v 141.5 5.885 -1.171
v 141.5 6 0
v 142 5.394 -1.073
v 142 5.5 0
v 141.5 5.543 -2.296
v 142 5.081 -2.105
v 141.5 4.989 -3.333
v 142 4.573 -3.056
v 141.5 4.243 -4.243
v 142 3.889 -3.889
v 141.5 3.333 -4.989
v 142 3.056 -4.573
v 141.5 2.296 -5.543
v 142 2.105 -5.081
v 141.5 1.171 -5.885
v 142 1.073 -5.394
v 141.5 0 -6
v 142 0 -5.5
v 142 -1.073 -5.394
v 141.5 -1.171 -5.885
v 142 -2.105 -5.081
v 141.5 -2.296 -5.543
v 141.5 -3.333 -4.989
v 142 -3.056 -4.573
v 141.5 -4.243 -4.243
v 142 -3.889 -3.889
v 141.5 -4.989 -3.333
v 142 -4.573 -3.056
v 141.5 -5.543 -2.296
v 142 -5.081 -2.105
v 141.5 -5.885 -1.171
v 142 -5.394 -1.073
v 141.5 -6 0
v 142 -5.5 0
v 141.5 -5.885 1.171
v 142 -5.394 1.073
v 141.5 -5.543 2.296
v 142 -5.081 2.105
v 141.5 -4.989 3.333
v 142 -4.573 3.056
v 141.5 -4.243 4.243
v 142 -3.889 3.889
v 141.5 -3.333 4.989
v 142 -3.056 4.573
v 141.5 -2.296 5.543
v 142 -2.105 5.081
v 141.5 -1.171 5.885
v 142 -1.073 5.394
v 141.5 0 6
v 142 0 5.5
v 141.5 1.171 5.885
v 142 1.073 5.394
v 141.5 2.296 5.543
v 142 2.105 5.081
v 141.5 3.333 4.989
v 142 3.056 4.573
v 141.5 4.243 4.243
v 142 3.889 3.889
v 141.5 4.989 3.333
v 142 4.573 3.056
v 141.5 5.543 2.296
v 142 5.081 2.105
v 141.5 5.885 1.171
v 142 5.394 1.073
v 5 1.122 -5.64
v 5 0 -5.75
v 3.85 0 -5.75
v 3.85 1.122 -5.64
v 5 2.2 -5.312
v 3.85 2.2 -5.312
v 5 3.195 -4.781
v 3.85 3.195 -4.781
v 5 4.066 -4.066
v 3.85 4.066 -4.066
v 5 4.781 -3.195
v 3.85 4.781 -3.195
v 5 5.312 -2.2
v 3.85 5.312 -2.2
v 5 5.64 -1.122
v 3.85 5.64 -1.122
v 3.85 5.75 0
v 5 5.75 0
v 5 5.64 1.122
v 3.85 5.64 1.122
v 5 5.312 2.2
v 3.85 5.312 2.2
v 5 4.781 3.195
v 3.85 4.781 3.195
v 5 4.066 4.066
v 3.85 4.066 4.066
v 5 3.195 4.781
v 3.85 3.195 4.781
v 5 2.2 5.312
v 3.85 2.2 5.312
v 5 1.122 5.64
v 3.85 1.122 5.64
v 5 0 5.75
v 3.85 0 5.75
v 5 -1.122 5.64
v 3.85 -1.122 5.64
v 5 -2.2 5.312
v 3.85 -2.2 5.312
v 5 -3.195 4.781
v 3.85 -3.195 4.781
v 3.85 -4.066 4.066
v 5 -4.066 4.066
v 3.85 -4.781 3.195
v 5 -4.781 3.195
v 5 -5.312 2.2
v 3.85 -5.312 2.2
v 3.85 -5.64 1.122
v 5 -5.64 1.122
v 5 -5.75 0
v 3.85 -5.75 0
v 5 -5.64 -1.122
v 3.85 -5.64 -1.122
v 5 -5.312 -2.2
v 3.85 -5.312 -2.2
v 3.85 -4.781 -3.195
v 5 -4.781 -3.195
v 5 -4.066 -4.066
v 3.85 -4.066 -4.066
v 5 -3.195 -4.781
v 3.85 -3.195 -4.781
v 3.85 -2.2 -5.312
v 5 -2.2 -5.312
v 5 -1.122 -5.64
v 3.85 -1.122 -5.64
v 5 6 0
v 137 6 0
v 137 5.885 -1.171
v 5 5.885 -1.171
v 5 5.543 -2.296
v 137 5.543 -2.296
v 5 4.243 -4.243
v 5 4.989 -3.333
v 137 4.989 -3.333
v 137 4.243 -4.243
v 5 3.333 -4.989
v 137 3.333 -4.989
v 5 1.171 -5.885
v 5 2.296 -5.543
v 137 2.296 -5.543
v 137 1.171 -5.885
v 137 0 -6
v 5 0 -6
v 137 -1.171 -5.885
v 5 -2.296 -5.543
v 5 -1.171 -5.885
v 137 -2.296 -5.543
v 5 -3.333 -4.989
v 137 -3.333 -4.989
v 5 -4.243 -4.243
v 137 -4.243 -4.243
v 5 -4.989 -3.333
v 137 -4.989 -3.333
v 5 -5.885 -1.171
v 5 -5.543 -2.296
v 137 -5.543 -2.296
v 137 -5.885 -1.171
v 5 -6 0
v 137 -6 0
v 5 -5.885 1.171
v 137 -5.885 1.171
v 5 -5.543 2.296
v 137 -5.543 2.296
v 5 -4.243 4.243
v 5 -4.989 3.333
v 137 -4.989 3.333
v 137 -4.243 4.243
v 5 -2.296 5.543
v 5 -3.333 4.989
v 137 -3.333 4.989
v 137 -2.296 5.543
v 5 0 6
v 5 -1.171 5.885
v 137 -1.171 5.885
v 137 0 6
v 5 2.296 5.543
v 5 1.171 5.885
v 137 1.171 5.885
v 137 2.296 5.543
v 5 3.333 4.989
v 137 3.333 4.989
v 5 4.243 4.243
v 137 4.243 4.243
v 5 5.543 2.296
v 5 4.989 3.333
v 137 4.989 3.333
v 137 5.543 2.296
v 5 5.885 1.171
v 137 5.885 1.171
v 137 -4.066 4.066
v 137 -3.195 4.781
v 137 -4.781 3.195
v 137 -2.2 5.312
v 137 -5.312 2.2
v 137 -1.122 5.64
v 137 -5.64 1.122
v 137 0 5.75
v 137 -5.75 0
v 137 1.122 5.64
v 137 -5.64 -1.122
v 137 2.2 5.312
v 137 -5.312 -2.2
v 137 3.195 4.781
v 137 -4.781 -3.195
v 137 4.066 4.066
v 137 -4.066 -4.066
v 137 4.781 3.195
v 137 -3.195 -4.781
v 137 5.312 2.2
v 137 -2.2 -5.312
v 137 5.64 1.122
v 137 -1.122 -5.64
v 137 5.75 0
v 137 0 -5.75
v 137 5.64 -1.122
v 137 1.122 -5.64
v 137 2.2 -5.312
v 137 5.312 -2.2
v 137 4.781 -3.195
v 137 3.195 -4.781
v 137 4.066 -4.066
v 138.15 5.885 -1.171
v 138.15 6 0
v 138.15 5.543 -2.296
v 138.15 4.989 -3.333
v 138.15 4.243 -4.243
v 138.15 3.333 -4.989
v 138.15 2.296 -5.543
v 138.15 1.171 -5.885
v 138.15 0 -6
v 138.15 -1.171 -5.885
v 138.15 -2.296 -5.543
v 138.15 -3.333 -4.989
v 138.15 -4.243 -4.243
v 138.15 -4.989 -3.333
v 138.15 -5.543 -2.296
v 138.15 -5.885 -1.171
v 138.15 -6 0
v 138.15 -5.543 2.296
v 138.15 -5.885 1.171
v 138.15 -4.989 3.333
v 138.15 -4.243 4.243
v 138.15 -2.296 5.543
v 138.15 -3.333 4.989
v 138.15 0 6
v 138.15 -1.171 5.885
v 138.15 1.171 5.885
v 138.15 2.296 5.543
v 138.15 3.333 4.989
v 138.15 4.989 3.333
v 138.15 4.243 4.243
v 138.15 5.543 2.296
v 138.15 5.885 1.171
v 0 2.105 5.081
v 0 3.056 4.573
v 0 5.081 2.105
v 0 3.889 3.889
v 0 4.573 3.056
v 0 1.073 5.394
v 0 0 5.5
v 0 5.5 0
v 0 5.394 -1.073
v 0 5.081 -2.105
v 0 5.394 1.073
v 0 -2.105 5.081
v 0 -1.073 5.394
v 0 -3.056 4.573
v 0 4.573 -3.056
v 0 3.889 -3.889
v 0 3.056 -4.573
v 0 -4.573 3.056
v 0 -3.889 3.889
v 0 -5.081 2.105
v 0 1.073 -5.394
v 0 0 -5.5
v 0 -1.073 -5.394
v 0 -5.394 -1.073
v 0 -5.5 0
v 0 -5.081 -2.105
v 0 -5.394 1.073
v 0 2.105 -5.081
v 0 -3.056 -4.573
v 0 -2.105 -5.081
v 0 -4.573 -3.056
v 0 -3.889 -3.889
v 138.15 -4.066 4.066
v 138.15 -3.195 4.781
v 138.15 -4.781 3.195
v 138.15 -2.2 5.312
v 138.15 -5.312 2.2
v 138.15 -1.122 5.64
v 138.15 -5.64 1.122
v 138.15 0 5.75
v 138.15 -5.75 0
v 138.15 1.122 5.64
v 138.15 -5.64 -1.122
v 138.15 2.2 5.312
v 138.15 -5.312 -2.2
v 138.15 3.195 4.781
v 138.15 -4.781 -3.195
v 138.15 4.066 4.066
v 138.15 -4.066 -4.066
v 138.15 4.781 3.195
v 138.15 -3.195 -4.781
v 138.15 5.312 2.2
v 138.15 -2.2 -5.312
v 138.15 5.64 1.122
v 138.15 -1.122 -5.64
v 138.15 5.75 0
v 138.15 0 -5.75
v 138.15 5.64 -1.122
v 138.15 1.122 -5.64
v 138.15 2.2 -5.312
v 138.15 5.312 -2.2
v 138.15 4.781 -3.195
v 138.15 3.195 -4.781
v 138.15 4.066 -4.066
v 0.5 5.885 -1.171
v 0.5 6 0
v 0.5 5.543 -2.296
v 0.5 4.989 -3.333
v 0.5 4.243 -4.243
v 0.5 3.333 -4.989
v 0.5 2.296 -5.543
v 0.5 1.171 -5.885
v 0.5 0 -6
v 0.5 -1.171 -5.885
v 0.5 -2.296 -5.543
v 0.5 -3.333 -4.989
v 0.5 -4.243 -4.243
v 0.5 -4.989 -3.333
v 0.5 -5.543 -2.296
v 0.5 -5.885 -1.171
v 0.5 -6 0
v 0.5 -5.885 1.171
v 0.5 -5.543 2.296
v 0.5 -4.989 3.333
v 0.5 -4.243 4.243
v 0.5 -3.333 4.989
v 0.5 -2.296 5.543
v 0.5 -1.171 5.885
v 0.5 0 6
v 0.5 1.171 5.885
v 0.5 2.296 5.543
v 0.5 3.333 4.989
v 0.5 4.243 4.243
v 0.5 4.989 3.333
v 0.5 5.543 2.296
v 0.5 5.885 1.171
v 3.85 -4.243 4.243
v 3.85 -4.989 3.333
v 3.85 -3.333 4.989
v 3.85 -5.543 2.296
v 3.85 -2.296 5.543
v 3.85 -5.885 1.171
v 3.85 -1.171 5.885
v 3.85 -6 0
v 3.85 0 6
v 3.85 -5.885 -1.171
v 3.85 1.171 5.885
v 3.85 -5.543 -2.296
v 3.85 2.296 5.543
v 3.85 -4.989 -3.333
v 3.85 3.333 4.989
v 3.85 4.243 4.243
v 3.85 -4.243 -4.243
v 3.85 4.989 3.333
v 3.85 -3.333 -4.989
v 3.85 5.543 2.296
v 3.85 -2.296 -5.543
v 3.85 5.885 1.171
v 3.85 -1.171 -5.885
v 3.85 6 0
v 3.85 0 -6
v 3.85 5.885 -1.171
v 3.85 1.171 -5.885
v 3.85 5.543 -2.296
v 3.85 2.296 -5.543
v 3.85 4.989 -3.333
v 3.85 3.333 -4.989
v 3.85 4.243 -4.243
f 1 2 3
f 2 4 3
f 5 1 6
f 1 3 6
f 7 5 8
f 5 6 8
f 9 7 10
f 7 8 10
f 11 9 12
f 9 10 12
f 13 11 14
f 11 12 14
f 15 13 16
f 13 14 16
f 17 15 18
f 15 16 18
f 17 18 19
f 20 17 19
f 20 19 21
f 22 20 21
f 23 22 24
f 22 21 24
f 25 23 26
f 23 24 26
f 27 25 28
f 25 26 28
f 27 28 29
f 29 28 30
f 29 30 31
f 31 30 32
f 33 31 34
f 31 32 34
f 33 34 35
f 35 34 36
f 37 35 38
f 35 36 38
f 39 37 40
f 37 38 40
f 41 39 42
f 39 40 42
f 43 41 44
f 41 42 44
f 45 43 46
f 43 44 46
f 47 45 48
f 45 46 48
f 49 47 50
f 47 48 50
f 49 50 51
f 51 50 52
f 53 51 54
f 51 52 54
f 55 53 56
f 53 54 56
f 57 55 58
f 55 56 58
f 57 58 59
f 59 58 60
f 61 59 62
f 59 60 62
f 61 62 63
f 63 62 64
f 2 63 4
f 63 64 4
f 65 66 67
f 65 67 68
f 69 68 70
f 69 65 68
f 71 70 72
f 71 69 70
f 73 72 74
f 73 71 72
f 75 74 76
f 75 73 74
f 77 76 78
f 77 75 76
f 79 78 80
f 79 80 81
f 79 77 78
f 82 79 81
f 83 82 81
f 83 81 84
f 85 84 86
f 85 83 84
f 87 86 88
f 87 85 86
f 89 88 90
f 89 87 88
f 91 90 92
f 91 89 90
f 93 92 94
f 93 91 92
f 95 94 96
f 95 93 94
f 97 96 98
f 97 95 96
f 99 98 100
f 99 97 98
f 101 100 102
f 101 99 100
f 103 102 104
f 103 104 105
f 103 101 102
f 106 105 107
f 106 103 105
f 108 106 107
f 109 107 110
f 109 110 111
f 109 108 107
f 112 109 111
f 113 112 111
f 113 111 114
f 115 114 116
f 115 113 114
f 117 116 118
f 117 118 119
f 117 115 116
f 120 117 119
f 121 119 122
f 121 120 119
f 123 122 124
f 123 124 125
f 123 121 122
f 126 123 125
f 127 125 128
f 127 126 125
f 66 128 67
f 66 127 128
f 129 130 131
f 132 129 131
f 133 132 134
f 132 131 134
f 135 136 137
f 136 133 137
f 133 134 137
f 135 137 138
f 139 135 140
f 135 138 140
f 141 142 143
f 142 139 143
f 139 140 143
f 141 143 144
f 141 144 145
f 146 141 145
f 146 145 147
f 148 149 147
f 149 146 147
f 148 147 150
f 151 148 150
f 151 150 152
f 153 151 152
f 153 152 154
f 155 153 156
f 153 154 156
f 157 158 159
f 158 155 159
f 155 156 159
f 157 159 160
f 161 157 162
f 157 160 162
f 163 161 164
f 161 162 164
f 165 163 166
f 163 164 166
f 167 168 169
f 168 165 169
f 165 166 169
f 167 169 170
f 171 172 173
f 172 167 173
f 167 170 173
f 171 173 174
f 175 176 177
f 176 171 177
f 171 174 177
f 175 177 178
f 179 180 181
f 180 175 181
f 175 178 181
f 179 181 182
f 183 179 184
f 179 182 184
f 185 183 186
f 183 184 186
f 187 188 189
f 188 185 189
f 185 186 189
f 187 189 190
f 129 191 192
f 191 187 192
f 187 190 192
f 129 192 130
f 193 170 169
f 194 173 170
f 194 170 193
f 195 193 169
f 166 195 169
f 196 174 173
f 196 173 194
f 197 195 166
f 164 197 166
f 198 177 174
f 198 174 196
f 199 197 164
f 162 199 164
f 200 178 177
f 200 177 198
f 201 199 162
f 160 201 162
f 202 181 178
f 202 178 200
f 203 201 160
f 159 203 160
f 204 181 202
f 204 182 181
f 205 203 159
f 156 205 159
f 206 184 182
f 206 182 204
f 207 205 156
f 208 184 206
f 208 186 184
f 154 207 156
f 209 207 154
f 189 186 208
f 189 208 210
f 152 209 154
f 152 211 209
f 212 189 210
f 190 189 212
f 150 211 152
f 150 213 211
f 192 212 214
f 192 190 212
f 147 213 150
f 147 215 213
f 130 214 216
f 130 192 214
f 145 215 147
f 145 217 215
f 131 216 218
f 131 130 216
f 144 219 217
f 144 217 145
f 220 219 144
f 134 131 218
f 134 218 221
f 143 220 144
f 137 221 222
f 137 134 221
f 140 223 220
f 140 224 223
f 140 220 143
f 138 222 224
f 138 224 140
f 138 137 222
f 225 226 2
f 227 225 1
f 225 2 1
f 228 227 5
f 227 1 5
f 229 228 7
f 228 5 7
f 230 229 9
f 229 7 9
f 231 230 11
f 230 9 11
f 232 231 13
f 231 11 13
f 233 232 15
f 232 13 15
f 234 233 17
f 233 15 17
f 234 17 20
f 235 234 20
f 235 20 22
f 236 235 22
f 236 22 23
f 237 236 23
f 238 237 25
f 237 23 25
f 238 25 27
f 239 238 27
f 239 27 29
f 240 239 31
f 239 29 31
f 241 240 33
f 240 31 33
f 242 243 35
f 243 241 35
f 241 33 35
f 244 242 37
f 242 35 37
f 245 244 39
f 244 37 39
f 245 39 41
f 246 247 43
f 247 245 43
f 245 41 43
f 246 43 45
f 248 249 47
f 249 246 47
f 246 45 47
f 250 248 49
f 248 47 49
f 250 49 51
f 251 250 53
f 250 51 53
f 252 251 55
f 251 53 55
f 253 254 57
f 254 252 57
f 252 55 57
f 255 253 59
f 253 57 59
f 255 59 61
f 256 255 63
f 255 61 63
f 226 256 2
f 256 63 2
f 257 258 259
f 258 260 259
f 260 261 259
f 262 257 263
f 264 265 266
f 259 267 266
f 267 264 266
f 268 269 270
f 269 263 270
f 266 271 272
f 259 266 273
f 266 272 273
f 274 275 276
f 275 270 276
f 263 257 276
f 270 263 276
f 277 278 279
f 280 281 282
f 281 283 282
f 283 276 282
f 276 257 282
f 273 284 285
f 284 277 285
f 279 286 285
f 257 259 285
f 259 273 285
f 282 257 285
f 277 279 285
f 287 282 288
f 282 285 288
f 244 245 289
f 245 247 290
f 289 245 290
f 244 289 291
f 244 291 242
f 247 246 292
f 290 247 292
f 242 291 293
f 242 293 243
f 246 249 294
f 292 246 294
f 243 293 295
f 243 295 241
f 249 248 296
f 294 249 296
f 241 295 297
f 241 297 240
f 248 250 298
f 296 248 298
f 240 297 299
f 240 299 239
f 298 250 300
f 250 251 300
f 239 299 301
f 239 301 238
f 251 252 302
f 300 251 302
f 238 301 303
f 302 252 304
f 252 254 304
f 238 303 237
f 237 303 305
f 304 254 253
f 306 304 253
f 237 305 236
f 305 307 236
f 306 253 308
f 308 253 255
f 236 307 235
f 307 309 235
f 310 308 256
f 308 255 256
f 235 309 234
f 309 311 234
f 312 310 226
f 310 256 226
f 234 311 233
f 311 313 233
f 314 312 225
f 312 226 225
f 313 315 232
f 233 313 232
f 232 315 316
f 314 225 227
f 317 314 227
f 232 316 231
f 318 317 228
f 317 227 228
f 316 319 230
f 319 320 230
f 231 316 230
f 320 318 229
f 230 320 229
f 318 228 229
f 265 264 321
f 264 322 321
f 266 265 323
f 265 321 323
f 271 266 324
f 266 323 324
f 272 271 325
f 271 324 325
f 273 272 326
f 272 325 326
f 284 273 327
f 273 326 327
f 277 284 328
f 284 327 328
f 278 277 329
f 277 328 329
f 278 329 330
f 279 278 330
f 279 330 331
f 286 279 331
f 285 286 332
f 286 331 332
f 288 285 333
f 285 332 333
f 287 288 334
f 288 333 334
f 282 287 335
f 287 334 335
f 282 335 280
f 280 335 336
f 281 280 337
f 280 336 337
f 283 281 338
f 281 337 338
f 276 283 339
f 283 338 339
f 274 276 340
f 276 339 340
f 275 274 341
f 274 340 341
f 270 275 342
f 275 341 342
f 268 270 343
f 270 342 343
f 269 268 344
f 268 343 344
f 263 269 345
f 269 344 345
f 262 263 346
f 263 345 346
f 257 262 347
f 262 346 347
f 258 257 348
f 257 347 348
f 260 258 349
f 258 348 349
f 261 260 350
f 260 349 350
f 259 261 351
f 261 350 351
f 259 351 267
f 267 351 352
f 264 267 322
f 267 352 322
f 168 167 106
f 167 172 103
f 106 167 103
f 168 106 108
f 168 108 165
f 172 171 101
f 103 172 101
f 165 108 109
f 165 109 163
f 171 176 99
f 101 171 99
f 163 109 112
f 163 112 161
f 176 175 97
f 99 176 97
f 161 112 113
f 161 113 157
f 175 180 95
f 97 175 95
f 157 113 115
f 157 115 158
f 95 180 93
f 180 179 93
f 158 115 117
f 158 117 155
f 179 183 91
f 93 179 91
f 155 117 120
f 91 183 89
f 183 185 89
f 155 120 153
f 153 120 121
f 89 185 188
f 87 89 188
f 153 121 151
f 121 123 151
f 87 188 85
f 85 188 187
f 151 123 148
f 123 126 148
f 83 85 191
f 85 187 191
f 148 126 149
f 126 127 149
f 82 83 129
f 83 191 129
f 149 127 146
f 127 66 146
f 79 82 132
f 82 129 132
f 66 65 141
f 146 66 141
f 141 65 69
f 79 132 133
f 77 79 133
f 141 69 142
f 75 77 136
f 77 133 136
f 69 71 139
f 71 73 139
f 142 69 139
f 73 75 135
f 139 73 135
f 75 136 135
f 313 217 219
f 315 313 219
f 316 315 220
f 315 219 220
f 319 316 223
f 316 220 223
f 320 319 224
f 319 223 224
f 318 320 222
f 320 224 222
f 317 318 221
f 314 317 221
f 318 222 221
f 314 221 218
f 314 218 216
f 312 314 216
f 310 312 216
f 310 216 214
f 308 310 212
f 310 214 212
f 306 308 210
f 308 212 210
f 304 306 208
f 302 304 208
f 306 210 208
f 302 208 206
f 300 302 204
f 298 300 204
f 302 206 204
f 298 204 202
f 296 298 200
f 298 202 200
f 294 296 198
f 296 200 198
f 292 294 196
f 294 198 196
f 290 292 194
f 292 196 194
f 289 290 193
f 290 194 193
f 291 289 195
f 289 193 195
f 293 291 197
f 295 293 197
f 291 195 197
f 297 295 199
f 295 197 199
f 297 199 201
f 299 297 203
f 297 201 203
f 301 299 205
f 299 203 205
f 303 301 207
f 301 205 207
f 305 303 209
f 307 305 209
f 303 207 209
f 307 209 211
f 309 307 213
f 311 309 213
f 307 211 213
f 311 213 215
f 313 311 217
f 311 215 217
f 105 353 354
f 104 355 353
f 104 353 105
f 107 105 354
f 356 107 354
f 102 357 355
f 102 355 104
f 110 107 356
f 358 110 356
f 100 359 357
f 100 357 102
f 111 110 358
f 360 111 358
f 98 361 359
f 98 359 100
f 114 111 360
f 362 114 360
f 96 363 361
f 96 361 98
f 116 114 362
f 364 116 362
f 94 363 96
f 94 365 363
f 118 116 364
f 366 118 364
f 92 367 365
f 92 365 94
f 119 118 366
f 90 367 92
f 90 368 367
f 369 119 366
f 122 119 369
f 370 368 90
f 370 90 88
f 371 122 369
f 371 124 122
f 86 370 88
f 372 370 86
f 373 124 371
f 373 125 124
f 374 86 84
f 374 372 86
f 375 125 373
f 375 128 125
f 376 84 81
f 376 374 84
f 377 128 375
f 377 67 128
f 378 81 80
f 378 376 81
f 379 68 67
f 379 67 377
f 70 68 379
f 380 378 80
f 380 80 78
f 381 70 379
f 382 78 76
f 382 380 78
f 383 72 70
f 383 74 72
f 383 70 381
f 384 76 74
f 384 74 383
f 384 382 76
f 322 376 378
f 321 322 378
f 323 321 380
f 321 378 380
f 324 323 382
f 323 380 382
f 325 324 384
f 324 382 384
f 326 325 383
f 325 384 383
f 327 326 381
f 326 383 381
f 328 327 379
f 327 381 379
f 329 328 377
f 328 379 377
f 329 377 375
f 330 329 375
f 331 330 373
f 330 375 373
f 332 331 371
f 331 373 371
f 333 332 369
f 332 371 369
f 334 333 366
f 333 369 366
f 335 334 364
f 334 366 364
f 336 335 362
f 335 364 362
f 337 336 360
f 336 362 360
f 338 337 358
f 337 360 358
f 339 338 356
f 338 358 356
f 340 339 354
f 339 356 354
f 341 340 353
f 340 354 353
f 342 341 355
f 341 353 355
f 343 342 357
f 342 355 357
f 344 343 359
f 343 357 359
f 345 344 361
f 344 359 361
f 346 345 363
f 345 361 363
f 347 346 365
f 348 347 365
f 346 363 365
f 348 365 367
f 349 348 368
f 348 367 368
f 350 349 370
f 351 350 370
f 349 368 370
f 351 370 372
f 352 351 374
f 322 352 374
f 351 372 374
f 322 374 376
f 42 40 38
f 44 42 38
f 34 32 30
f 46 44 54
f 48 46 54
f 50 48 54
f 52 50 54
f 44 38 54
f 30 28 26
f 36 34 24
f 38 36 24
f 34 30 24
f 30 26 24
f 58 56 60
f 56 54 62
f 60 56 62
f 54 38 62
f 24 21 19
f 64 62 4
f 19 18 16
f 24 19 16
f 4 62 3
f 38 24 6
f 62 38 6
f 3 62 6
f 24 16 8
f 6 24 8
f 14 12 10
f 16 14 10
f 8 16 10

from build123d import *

# Parameters (mm, degrees)
SKETCH_2_R          = 12
SKETCH_2_R_2        = 5.75
CUT_EXTRUDE_1_DEPTH = 1.15
SKETCH_3_R          = 12
SKETCH_3_R_2        = 5.75
CUT_EXTRUDE_2_DEPTH = 1.15


with BuildPart() as part:
    # ｽｹｯﾁ1 → 回転1 (revolve)
    with BuildSketch(Plane.XY):
        Polygon((0, 0), (0, 5.5), (0.5, 6), (141.5, 6), (142, 5.5), (142, 0), align=None)
    revolve(axis=Axis((142, 0, 0), (-1, 0, 0)))

    # ｽｹｯﾁ2 → ｶｯﾄ - 押し出し1 (cut)
    with BuildSketch(Plane(origin=(5, 0, 0), x_dir=(0, 0, -1), z_dir=(1, 0, 0))):
        Circle(SKETCH_2_R)
        Circle(SKETCH_2_R_2, mode=Mode.SUBTRACT)
    extrude(amount=-CUT_EXTRUDE_1_DEPTH, mode=Mode.SUBTRACT)

    # ｽｹｯﾁ3 → ｶｯﾄ - 押し出し2 (cut)
    with BuildSketch(Plane(origin=(137, 0, 0), x_dir=(0, 0, -1), z_dir=(1, 0, 0))):
        Circle(SKETCH_3_R)
        Circle(SKETCH_3_R_2, mode=Mode.SUBTRACT)
    extrude(amount=CUT_EXTRUDE_2_DEPTH, mode=Mode.SUBTRACT)


solid = part.part
